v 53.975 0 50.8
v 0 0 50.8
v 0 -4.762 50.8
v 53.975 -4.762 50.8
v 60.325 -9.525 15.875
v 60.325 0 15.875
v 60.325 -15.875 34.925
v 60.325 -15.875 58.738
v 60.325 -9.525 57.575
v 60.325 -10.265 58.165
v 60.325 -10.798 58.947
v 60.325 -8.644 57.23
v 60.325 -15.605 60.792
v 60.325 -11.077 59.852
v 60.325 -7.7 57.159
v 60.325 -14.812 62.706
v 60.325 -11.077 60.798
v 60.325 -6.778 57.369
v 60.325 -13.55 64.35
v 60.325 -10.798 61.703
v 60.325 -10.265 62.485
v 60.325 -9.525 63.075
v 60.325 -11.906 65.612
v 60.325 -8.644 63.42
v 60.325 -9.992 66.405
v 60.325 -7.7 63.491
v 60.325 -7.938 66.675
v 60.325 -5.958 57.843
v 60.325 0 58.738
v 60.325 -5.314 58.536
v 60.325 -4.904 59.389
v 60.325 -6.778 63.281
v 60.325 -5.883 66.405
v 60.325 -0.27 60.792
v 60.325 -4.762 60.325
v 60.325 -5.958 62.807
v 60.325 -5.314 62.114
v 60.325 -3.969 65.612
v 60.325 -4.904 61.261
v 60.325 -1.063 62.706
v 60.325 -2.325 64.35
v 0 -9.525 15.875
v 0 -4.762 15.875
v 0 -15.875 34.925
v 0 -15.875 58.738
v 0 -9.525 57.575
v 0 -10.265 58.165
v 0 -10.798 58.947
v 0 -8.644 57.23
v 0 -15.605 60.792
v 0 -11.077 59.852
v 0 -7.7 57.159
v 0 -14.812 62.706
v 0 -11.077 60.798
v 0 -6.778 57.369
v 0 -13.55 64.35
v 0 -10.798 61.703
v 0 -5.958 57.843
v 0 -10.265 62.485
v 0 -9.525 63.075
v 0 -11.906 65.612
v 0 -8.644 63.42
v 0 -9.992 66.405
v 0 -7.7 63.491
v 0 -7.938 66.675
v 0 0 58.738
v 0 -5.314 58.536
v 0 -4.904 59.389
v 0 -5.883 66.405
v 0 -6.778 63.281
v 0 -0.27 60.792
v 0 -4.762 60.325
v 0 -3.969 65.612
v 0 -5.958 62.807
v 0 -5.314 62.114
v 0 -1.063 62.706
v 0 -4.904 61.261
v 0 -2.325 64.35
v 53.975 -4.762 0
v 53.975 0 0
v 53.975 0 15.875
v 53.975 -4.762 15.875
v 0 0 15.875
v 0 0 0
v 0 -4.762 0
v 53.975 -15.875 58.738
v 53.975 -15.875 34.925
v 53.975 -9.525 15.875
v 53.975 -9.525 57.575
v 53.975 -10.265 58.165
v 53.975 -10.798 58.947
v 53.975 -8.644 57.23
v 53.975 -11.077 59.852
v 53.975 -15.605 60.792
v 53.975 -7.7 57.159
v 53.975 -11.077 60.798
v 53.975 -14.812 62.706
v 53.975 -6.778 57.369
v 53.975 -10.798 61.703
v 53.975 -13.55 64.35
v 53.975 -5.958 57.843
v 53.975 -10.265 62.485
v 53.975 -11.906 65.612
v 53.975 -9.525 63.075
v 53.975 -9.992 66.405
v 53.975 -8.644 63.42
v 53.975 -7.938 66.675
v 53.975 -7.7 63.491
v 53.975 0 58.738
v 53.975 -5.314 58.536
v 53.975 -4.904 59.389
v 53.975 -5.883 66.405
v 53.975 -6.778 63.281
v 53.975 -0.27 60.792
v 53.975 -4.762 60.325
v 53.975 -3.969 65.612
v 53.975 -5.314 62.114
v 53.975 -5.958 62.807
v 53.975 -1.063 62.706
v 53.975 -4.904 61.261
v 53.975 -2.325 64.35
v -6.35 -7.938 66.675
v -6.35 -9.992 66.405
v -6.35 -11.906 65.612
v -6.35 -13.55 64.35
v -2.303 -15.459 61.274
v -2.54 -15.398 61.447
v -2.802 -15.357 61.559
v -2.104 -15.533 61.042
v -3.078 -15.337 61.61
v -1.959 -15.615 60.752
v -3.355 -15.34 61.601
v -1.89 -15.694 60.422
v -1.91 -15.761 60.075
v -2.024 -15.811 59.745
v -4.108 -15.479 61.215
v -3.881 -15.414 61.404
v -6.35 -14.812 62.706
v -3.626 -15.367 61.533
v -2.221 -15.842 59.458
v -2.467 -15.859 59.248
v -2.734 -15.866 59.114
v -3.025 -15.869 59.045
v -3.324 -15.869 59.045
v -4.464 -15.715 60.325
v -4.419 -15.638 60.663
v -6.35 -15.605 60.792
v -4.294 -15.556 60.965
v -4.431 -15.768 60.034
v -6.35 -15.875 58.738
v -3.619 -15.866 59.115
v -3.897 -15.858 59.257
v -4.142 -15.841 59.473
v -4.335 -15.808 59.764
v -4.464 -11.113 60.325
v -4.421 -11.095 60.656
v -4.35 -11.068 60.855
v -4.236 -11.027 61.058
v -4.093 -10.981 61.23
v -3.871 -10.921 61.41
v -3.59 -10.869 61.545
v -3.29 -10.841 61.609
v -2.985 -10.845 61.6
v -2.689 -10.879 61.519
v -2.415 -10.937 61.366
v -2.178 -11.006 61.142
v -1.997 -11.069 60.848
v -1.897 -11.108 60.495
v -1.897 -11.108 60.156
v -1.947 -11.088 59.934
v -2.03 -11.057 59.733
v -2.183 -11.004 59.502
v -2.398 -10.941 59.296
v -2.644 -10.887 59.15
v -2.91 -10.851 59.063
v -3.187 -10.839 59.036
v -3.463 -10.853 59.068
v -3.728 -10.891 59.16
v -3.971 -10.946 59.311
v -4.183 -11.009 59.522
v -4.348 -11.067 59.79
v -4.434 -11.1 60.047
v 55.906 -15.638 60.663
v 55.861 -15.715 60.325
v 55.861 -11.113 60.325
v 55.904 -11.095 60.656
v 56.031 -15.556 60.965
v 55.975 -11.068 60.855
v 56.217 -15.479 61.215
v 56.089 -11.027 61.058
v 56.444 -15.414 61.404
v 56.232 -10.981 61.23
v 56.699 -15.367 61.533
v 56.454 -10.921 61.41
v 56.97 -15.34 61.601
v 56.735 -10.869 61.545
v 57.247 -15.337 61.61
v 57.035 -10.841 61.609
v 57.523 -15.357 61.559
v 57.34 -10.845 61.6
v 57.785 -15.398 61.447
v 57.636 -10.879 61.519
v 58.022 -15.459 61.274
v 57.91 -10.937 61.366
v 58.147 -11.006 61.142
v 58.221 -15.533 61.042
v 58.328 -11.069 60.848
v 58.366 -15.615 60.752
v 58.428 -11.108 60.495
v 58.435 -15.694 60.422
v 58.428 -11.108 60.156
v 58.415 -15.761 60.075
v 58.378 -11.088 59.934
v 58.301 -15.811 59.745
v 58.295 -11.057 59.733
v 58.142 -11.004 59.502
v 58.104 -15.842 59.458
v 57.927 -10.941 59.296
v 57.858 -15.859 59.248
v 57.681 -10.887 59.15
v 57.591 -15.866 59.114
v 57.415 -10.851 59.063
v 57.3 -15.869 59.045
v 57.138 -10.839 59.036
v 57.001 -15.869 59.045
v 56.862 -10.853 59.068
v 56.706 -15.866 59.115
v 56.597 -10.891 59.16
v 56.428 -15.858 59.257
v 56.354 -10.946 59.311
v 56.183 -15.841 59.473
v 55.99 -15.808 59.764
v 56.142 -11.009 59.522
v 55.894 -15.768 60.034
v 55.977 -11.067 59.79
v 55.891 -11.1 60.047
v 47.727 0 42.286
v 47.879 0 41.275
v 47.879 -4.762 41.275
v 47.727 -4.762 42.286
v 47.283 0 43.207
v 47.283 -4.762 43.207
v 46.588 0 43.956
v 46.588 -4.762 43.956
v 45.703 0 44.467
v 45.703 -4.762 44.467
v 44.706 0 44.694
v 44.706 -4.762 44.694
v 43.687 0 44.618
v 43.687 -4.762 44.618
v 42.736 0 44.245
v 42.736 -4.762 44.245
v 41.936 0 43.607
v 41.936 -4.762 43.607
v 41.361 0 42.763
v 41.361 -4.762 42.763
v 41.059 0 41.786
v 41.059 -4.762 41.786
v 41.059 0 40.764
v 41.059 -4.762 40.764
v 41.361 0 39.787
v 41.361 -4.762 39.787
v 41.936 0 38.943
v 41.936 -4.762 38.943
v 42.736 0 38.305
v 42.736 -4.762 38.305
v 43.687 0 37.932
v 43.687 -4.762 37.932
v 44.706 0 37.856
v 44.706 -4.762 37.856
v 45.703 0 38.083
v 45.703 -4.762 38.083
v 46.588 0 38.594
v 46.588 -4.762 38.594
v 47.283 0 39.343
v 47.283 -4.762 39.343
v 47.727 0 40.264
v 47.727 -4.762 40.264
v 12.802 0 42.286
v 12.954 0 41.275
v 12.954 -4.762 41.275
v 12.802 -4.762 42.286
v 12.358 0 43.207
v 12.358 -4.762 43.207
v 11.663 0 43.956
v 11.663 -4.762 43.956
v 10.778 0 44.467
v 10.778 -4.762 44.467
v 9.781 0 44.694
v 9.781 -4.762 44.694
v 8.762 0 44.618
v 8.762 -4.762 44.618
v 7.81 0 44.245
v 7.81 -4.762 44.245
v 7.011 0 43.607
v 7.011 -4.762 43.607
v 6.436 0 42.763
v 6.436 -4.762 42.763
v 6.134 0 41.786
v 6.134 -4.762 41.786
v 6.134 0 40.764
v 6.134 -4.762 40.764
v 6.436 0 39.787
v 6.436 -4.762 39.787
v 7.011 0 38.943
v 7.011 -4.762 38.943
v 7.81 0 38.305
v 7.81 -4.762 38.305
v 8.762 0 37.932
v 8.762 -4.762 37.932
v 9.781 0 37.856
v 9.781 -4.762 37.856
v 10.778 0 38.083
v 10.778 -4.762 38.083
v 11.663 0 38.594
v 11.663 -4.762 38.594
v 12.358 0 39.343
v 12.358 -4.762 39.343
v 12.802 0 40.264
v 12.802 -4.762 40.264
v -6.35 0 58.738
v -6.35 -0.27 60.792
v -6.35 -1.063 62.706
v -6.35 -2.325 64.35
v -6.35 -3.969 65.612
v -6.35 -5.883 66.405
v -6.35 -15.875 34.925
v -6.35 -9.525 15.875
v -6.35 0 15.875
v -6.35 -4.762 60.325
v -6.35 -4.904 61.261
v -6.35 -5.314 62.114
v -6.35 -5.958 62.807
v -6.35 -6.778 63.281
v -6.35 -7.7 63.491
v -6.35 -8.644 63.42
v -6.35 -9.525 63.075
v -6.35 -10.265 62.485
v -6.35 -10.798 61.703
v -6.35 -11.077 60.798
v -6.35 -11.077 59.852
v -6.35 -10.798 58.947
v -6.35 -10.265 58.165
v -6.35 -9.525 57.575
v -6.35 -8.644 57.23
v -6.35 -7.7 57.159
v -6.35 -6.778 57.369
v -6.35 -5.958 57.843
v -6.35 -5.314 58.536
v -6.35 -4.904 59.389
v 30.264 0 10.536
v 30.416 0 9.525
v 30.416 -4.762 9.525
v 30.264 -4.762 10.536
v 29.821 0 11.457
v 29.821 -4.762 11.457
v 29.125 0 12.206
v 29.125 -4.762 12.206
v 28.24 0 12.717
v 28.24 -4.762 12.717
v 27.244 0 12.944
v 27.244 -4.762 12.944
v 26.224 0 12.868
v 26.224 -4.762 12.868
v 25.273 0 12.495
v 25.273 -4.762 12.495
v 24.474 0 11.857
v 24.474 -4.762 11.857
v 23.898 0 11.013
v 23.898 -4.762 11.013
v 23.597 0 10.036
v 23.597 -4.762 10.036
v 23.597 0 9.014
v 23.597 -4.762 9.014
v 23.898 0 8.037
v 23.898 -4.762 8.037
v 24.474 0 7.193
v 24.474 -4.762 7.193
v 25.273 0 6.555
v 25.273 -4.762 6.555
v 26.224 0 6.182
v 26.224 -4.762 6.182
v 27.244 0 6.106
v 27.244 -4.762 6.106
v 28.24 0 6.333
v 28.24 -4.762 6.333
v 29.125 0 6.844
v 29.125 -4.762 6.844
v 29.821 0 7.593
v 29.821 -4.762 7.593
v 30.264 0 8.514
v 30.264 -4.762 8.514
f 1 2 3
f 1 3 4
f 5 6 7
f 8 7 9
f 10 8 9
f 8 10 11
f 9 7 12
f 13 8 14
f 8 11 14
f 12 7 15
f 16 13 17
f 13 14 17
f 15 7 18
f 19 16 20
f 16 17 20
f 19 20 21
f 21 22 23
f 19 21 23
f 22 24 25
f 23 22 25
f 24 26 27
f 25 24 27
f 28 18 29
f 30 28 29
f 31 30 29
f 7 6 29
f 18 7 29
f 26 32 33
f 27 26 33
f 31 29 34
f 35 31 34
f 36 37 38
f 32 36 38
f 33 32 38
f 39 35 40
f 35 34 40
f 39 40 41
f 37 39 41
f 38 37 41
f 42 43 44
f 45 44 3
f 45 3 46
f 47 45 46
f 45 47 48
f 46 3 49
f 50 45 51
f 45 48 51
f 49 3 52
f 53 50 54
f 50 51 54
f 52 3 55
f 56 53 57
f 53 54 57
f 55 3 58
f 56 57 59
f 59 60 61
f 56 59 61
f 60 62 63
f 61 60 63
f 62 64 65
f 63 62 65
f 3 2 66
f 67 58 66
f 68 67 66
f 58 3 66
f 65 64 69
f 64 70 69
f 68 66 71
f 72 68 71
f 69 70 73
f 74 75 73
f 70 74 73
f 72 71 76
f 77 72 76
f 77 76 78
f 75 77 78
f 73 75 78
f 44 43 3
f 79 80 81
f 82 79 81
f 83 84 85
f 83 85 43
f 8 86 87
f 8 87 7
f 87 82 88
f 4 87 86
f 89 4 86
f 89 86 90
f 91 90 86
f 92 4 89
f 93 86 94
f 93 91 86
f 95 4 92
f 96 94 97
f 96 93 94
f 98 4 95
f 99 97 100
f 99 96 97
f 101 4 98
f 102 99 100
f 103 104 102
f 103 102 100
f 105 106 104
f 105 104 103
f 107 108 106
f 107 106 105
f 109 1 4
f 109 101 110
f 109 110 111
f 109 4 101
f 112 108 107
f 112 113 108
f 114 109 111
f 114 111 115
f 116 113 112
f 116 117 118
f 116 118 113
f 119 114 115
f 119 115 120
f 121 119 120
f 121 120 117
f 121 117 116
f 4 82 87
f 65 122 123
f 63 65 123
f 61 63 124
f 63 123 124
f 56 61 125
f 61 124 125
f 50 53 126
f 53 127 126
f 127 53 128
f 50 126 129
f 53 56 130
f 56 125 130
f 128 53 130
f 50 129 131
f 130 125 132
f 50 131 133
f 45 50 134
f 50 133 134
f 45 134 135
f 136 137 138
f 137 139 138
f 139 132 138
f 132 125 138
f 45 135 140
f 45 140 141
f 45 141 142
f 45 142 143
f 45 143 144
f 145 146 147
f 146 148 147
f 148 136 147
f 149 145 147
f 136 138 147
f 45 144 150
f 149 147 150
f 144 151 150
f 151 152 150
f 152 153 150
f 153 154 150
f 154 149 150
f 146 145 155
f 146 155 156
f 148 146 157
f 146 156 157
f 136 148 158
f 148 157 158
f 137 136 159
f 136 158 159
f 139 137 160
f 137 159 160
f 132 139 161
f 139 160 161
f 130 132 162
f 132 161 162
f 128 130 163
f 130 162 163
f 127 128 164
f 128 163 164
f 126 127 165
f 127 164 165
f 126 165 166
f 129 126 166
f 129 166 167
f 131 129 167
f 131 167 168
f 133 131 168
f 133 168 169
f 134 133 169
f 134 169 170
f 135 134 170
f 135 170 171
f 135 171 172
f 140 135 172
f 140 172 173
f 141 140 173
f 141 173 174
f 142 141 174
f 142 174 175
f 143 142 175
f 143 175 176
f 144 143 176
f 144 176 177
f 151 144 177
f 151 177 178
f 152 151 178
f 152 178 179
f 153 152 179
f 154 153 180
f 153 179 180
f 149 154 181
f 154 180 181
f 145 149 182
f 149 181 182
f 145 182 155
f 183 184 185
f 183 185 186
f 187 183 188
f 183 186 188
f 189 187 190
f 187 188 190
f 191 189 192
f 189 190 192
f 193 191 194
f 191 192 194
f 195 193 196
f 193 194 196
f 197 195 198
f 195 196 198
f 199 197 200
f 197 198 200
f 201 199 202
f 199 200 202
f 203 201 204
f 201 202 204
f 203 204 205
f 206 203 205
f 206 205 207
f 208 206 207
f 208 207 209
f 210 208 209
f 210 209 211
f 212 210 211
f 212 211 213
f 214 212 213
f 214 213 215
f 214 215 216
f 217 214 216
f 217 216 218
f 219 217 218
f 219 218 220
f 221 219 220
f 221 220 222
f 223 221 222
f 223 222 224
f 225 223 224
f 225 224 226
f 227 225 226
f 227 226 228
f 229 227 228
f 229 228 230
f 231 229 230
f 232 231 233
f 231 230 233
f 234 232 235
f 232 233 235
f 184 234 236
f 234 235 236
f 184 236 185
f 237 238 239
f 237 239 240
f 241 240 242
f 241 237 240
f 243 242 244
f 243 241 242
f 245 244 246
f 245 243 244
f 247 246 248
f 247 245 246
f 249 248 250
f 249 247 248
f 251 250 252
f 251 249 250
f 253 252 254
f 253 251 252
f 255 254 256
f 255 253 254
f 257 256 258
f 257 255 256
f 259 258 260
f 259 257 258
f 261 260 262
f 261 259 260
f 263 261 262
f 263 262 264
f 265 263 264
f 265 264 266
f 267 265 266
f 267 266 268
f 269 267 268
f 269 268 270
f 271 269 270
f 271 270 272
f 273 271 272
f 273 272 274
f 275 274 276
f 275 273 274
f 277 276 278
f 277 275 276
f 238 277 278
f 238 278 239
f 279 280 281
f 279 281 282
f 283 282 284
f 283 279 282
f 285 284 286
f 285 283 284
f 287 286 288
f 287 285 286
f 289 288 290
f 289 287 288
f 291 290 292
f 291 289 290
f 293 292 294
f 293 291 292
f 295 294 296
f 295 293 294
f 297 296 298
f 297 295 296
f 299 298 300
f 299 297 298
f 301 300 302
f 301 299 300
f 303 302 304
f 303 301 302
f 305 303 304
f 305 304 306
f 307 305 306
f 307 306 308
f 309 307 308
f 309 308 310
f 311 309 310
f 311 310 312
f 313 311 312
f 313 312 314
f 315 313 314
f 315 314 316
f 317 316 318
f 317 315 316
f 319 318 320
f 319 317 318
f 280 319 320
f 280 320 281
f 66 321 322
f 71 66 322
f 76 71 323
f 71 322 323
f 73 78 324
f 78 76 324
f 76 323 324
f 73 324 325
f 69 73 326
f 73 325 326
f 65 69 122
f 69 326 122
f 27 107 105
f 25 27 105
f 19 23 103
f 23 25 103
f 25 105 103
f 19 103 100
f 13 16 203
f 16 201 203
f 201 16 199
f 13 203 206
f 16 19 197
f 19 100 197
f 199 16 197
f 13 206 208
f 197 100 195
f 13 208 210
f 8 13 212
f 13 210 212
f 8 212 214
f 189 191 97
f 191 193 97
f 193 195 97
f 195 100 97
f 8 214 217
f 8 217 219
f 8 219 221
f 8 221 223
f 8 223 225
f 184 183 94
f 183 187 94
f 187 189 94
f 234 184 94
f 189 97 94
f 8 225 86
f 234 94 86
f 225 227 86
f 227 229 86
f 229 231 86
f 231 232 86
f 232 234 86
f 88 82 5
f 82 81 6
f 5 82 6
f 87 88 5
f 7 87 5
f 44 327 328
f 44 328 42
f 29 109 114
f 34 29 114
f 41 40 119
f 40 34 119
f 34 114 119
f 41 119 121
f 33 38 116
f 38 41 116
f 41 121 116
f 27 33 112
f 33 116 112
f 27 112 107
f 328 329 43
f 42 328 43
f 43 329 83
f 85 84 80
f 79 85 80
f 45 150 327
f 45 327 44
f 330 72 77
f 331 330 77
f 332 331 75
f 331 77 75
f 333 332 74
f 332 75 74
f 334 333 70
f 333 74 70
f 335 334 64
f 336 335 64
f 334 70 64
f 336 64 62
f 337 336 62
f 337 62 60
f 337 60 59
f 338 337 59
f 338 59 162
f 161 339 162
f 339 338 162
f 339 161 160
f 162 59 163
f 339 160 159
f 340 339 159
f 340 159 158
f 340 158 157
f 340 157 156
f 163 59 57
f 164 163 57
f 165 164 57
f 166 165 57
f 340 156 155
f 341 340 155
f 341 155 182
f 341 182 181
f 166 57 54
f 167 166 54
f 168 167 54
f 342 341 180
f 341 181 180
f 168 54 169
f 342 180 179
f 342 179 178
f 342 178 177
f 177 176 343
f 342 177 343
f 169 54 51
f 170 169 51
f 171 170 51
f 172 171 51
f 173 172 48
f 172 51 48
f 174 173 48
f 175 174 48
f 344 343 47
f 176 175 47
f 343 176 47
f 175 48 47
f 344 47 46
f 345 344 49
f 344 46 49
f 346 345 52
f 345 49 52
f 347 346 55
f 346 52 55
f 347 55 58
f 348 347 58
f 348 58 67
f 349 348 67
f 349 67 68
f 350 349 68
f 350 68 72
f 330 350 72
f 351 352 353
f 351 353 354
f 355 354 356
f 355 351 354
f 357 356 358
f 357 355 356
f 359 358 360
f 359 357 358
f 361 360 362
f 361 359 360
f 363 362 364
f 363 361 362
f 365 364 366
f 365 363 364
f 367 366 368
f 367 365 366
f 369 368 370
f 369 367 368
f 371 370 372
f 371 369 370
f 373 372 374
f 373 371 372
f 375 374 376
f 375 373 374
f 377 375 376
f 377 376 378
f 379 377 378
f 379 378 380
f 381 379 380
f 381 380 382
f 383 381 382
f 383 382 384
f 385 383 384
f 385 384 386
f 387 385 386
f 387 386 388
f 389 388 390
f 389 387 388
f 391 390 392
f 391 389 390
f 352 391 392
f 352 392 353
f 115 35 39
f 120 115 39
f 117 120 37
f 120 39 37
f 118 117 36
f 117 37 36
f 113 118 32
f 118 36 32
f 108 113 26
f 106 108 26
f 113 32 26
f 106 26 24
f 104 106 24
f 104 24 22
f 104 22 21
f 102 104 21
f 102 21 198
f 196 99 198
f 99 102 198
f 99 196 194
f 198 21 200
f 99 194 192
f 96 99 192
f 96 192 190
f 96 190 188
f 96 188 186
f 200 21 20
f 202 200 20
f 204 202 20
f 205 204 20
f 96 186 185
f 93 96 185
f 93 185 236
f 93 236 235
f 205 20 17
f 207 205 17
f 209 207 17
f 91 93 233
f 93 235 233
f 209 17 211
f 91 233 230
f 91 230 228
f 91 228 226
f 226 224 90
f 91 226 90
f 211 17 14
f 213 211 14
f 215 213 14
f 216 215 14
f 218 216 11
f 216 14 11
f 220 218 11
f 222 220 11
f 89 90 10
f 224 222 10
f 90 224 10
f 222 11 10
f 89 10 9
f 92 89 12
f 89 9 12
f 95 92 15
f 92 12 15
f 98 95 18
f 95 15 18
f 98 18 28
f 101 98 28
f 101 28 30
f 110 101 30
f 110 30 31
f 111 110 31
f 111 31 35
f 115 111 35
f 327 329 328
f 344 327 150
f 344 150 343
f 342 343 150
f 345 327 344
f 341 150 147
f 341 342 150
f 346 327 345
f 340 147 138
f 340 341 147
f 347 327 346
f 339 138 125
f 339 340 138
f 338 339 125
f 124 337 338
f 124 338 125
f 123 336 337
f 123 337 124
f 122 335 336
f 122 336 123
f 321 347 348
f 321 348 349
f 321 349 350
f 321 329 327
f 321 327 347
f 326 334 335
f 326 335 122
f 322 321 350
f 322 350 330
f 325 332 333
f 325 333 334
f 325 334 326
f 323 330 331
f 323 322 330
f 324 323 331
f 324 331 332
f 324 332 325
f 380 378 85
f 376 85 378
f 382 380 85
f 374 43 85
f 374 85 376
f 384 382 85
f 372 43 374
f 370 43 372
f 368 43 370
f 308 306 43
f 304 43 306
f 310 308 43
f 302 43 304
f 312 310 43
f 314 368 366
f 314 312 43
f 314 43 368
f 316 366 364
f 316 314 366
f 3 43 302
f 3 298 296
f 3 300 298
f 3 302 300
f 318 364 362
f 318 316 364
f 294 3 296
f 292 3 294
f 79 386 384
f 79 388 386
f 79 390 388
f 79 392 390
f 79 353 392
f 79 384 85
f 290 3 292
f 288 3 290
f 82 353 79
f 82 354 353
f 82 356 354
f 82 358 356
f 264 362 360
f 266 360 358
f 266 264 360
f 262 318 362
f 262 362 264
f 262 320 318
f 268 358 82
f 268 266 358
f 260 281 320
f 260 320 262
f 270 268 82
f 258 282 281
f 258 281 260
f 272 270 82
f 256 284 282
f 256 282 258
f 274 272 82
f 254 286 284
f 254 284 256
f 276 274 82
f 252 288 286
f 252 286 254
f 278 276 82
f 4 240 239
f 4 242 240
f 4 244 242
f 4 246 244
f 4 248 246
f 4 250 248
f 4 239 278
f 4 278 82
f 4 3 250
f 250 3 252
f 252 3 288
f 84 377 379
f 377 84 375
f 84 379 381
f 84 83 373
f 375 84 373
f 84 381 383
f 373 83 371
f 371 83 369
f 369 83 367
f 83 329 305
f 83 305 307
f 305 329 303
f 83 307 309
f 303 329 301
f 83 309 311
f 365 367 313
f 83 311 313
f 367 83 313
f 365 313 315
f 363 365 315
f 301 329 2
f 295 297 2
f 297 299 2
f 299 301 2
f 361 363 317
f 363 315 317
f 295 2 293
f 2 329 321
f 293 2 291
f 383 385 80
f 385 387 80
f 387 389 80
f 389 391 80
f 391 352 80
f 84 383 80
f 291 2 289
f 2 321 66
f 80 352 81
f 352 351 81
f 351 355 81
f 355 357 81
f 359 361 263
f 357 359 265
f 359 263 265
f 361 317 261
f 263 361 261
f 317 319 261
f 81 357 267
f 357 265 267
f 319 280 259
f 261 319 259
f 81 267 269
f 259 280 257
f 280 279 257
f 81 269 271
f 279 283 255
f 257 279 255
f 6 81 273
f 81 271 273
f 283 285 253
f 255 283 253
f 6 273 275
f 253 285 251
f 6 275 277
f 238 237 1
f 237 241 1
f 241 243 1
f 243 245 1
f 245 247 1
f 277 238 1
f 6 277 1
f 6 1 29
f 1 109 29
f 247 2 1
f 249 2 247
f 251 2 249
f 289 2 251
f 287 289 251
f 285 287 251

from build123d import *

# Parameters (mm, degrees)
F0_W         = 53.975
F0_H         = 50.8
F0_R         = 3.429
F1_DEPTH     = 4.7625
F2_W         = 6.35
F2_H         = 50.8
F3_DEPTH     = 15.875
F4_R         = 3.175
F5_DEPTH     = 6.35
F6_R         = 3.175
F7_DEPTH     = 6.35
F9_D         = 2.5781
F9_DEPTH     = 7.9375
F9_TIP       = 0.774539381
F10_T1_DEPTH = 46.0375
F10_T3_DEPTH = 46.0375
F11_SIZE2    = 19.05
F11_SIZE     = 6.35
F12_SIZE2    = 19.05
F12_SIZE     = 6.35


# Not quite as in the source:
# - a fillet or chamfer that OpenCascade refuses, or shapes differently, is made with other operations: its cross-section is extruded or revolved along the edge and cut away or added


with BuildPart() as f1:
    # F0 (on Front) → F1 (new body)
    with BuildSketch(Plane.XZ):
        with Locations((26.9875, 25.4)):
            Rectangle(F0_W, F0_H)
        with Locations((26.9875, 9.525)):
            Circle(F0_R, mode=Mode.SUBTRACT)
        with Locations((9.525, 41.275)):
            Circle(F0_R, mode=Mode.SUBTRACT)
        with Locations((44.45, 41.275)):
            Circle(F0_R, mode=Mode.SUBTRACT)
    extrude(amount=F1_DEPTH)

    # F2 (on Front) → F3 (join)
    with BuildSketch(Plane.XZ):
        with Locations((-3.175, 41.275)):
            Rectangle(F2_W, F2_H)
        with Locations((57.15, 41.275)):
            Rectangle(F2_W, F2_H)
    extrude(amount=F3_DEPTH)

    # F4 (on Right) → F5 (cut, through all)
    with BuildSketch(Plane.YZ):
        with Locations((-7.9375, 60.325)):
            Circle(F4_R)
    extrude(amount=-F5_DEPTH, mode=Mode.SUBTRACT)

    # F6 (on face) → F7 (cut)
    with BuildSketch(Plane.YZ.offset(60.325)):
        with Locations((-7.9375, 60.325)):
            Circle(F6_R)
    extrude(amount=-F7_DEPTH, mode=Mode.SUBTRACT)

    # F9
    with Locations(Plane.XZ.offset(15.875)):
        with Locations((-3.175, 60.325), (57.15, 60.325)):
            Hole(F9_D / 2, depth=F9_DEPTH)
            with Locations((0, 0, -(F9_DEPTH + F9_TIP / 2))):  # 118° drill point
                Cone(0, F9_D / 2, F9_TIP, mode=Mode.SUBTRACT)

    # F10: fillet of radius 7.9375 on 4 edges, made by hand

    # F10_s2 → F10_t1 (cut)
    with BuildSketch(Plane.YZ.offset(34.13125)):
        with BuildLine():
            ThreePointArc((-7.9375, 66.675), (-13.5501600757, 64.3501600757), (-15.875, 58.7375))
            Line((-15.875, 58.7375), (-15.875, 66.675))
            Line((-15.875, 66.675), (-7.9375, 66.675))
        make_face()
        with BuildLine():
            ThreePointArc((0, 58.7375), (-2.3248399243, 64.3501600757), (-7.9375, 66.675))
            Line((-7.9375, 66.675), (0, 66.675))
            Line((0, 66.675), (0, 58.7375))
        make_face()
    extrude(amount=F10_T1_DEPTH, mode=Mode.SUBTRACT)

    # F10_s4 → F10_t3 (cut)
    with BuildSketch(Plane.YZ.offset(-26.19375)):
        with BuildLine():
            ThreePointArc((-7.9375, 66.675), (-13.5501600757, 64.3501600757), (-15.875, 58.7375))
            Line((-15.875, 58.7375), (-15.875, 66.675))
            Line((-15.875, 66.675), (-7.9375, 66.675))
        make_face()
        with BuildLine():
            ThreePointArc((0, 58.7375), (-2.3248399243, 64.3501600757), (-7.9375, 66.675))
            Line((-7.9375, 66.675), (0, 66.675))
            Line((0, 66.675), (0, 58.7375))
        make_face()
    extrude(amount=F10_T3_DEPTH, mode=Mode.SUBTRACT)

    # F11
    f11_edges = [f1.edges().sort_by_distance(p)[0] for p in [
        (-3.175, -15.875, 15.875),
    ]]
    f11_side = f1.faces().sort_by_distance((-3.175, -7.9375, 15.875))[0]
    chamfer(f11_edges, length=F11_SIZE, length2=F11_SIZE2, reference=f11_side)

    # F12
    f12_edges = [f1.edges().sort_by_distance(p)[0] for p in [
        (57.15, -15.875, 15.875),
    ]]
    f12_side = f1.faces().sort_by_distance((57.15, -7.9375, 15.875))[0]
    chamfer(f12_edges, length=F12_SIZE, length2=F12_SIZE2, reference=f12_side)


solid = f1.part
